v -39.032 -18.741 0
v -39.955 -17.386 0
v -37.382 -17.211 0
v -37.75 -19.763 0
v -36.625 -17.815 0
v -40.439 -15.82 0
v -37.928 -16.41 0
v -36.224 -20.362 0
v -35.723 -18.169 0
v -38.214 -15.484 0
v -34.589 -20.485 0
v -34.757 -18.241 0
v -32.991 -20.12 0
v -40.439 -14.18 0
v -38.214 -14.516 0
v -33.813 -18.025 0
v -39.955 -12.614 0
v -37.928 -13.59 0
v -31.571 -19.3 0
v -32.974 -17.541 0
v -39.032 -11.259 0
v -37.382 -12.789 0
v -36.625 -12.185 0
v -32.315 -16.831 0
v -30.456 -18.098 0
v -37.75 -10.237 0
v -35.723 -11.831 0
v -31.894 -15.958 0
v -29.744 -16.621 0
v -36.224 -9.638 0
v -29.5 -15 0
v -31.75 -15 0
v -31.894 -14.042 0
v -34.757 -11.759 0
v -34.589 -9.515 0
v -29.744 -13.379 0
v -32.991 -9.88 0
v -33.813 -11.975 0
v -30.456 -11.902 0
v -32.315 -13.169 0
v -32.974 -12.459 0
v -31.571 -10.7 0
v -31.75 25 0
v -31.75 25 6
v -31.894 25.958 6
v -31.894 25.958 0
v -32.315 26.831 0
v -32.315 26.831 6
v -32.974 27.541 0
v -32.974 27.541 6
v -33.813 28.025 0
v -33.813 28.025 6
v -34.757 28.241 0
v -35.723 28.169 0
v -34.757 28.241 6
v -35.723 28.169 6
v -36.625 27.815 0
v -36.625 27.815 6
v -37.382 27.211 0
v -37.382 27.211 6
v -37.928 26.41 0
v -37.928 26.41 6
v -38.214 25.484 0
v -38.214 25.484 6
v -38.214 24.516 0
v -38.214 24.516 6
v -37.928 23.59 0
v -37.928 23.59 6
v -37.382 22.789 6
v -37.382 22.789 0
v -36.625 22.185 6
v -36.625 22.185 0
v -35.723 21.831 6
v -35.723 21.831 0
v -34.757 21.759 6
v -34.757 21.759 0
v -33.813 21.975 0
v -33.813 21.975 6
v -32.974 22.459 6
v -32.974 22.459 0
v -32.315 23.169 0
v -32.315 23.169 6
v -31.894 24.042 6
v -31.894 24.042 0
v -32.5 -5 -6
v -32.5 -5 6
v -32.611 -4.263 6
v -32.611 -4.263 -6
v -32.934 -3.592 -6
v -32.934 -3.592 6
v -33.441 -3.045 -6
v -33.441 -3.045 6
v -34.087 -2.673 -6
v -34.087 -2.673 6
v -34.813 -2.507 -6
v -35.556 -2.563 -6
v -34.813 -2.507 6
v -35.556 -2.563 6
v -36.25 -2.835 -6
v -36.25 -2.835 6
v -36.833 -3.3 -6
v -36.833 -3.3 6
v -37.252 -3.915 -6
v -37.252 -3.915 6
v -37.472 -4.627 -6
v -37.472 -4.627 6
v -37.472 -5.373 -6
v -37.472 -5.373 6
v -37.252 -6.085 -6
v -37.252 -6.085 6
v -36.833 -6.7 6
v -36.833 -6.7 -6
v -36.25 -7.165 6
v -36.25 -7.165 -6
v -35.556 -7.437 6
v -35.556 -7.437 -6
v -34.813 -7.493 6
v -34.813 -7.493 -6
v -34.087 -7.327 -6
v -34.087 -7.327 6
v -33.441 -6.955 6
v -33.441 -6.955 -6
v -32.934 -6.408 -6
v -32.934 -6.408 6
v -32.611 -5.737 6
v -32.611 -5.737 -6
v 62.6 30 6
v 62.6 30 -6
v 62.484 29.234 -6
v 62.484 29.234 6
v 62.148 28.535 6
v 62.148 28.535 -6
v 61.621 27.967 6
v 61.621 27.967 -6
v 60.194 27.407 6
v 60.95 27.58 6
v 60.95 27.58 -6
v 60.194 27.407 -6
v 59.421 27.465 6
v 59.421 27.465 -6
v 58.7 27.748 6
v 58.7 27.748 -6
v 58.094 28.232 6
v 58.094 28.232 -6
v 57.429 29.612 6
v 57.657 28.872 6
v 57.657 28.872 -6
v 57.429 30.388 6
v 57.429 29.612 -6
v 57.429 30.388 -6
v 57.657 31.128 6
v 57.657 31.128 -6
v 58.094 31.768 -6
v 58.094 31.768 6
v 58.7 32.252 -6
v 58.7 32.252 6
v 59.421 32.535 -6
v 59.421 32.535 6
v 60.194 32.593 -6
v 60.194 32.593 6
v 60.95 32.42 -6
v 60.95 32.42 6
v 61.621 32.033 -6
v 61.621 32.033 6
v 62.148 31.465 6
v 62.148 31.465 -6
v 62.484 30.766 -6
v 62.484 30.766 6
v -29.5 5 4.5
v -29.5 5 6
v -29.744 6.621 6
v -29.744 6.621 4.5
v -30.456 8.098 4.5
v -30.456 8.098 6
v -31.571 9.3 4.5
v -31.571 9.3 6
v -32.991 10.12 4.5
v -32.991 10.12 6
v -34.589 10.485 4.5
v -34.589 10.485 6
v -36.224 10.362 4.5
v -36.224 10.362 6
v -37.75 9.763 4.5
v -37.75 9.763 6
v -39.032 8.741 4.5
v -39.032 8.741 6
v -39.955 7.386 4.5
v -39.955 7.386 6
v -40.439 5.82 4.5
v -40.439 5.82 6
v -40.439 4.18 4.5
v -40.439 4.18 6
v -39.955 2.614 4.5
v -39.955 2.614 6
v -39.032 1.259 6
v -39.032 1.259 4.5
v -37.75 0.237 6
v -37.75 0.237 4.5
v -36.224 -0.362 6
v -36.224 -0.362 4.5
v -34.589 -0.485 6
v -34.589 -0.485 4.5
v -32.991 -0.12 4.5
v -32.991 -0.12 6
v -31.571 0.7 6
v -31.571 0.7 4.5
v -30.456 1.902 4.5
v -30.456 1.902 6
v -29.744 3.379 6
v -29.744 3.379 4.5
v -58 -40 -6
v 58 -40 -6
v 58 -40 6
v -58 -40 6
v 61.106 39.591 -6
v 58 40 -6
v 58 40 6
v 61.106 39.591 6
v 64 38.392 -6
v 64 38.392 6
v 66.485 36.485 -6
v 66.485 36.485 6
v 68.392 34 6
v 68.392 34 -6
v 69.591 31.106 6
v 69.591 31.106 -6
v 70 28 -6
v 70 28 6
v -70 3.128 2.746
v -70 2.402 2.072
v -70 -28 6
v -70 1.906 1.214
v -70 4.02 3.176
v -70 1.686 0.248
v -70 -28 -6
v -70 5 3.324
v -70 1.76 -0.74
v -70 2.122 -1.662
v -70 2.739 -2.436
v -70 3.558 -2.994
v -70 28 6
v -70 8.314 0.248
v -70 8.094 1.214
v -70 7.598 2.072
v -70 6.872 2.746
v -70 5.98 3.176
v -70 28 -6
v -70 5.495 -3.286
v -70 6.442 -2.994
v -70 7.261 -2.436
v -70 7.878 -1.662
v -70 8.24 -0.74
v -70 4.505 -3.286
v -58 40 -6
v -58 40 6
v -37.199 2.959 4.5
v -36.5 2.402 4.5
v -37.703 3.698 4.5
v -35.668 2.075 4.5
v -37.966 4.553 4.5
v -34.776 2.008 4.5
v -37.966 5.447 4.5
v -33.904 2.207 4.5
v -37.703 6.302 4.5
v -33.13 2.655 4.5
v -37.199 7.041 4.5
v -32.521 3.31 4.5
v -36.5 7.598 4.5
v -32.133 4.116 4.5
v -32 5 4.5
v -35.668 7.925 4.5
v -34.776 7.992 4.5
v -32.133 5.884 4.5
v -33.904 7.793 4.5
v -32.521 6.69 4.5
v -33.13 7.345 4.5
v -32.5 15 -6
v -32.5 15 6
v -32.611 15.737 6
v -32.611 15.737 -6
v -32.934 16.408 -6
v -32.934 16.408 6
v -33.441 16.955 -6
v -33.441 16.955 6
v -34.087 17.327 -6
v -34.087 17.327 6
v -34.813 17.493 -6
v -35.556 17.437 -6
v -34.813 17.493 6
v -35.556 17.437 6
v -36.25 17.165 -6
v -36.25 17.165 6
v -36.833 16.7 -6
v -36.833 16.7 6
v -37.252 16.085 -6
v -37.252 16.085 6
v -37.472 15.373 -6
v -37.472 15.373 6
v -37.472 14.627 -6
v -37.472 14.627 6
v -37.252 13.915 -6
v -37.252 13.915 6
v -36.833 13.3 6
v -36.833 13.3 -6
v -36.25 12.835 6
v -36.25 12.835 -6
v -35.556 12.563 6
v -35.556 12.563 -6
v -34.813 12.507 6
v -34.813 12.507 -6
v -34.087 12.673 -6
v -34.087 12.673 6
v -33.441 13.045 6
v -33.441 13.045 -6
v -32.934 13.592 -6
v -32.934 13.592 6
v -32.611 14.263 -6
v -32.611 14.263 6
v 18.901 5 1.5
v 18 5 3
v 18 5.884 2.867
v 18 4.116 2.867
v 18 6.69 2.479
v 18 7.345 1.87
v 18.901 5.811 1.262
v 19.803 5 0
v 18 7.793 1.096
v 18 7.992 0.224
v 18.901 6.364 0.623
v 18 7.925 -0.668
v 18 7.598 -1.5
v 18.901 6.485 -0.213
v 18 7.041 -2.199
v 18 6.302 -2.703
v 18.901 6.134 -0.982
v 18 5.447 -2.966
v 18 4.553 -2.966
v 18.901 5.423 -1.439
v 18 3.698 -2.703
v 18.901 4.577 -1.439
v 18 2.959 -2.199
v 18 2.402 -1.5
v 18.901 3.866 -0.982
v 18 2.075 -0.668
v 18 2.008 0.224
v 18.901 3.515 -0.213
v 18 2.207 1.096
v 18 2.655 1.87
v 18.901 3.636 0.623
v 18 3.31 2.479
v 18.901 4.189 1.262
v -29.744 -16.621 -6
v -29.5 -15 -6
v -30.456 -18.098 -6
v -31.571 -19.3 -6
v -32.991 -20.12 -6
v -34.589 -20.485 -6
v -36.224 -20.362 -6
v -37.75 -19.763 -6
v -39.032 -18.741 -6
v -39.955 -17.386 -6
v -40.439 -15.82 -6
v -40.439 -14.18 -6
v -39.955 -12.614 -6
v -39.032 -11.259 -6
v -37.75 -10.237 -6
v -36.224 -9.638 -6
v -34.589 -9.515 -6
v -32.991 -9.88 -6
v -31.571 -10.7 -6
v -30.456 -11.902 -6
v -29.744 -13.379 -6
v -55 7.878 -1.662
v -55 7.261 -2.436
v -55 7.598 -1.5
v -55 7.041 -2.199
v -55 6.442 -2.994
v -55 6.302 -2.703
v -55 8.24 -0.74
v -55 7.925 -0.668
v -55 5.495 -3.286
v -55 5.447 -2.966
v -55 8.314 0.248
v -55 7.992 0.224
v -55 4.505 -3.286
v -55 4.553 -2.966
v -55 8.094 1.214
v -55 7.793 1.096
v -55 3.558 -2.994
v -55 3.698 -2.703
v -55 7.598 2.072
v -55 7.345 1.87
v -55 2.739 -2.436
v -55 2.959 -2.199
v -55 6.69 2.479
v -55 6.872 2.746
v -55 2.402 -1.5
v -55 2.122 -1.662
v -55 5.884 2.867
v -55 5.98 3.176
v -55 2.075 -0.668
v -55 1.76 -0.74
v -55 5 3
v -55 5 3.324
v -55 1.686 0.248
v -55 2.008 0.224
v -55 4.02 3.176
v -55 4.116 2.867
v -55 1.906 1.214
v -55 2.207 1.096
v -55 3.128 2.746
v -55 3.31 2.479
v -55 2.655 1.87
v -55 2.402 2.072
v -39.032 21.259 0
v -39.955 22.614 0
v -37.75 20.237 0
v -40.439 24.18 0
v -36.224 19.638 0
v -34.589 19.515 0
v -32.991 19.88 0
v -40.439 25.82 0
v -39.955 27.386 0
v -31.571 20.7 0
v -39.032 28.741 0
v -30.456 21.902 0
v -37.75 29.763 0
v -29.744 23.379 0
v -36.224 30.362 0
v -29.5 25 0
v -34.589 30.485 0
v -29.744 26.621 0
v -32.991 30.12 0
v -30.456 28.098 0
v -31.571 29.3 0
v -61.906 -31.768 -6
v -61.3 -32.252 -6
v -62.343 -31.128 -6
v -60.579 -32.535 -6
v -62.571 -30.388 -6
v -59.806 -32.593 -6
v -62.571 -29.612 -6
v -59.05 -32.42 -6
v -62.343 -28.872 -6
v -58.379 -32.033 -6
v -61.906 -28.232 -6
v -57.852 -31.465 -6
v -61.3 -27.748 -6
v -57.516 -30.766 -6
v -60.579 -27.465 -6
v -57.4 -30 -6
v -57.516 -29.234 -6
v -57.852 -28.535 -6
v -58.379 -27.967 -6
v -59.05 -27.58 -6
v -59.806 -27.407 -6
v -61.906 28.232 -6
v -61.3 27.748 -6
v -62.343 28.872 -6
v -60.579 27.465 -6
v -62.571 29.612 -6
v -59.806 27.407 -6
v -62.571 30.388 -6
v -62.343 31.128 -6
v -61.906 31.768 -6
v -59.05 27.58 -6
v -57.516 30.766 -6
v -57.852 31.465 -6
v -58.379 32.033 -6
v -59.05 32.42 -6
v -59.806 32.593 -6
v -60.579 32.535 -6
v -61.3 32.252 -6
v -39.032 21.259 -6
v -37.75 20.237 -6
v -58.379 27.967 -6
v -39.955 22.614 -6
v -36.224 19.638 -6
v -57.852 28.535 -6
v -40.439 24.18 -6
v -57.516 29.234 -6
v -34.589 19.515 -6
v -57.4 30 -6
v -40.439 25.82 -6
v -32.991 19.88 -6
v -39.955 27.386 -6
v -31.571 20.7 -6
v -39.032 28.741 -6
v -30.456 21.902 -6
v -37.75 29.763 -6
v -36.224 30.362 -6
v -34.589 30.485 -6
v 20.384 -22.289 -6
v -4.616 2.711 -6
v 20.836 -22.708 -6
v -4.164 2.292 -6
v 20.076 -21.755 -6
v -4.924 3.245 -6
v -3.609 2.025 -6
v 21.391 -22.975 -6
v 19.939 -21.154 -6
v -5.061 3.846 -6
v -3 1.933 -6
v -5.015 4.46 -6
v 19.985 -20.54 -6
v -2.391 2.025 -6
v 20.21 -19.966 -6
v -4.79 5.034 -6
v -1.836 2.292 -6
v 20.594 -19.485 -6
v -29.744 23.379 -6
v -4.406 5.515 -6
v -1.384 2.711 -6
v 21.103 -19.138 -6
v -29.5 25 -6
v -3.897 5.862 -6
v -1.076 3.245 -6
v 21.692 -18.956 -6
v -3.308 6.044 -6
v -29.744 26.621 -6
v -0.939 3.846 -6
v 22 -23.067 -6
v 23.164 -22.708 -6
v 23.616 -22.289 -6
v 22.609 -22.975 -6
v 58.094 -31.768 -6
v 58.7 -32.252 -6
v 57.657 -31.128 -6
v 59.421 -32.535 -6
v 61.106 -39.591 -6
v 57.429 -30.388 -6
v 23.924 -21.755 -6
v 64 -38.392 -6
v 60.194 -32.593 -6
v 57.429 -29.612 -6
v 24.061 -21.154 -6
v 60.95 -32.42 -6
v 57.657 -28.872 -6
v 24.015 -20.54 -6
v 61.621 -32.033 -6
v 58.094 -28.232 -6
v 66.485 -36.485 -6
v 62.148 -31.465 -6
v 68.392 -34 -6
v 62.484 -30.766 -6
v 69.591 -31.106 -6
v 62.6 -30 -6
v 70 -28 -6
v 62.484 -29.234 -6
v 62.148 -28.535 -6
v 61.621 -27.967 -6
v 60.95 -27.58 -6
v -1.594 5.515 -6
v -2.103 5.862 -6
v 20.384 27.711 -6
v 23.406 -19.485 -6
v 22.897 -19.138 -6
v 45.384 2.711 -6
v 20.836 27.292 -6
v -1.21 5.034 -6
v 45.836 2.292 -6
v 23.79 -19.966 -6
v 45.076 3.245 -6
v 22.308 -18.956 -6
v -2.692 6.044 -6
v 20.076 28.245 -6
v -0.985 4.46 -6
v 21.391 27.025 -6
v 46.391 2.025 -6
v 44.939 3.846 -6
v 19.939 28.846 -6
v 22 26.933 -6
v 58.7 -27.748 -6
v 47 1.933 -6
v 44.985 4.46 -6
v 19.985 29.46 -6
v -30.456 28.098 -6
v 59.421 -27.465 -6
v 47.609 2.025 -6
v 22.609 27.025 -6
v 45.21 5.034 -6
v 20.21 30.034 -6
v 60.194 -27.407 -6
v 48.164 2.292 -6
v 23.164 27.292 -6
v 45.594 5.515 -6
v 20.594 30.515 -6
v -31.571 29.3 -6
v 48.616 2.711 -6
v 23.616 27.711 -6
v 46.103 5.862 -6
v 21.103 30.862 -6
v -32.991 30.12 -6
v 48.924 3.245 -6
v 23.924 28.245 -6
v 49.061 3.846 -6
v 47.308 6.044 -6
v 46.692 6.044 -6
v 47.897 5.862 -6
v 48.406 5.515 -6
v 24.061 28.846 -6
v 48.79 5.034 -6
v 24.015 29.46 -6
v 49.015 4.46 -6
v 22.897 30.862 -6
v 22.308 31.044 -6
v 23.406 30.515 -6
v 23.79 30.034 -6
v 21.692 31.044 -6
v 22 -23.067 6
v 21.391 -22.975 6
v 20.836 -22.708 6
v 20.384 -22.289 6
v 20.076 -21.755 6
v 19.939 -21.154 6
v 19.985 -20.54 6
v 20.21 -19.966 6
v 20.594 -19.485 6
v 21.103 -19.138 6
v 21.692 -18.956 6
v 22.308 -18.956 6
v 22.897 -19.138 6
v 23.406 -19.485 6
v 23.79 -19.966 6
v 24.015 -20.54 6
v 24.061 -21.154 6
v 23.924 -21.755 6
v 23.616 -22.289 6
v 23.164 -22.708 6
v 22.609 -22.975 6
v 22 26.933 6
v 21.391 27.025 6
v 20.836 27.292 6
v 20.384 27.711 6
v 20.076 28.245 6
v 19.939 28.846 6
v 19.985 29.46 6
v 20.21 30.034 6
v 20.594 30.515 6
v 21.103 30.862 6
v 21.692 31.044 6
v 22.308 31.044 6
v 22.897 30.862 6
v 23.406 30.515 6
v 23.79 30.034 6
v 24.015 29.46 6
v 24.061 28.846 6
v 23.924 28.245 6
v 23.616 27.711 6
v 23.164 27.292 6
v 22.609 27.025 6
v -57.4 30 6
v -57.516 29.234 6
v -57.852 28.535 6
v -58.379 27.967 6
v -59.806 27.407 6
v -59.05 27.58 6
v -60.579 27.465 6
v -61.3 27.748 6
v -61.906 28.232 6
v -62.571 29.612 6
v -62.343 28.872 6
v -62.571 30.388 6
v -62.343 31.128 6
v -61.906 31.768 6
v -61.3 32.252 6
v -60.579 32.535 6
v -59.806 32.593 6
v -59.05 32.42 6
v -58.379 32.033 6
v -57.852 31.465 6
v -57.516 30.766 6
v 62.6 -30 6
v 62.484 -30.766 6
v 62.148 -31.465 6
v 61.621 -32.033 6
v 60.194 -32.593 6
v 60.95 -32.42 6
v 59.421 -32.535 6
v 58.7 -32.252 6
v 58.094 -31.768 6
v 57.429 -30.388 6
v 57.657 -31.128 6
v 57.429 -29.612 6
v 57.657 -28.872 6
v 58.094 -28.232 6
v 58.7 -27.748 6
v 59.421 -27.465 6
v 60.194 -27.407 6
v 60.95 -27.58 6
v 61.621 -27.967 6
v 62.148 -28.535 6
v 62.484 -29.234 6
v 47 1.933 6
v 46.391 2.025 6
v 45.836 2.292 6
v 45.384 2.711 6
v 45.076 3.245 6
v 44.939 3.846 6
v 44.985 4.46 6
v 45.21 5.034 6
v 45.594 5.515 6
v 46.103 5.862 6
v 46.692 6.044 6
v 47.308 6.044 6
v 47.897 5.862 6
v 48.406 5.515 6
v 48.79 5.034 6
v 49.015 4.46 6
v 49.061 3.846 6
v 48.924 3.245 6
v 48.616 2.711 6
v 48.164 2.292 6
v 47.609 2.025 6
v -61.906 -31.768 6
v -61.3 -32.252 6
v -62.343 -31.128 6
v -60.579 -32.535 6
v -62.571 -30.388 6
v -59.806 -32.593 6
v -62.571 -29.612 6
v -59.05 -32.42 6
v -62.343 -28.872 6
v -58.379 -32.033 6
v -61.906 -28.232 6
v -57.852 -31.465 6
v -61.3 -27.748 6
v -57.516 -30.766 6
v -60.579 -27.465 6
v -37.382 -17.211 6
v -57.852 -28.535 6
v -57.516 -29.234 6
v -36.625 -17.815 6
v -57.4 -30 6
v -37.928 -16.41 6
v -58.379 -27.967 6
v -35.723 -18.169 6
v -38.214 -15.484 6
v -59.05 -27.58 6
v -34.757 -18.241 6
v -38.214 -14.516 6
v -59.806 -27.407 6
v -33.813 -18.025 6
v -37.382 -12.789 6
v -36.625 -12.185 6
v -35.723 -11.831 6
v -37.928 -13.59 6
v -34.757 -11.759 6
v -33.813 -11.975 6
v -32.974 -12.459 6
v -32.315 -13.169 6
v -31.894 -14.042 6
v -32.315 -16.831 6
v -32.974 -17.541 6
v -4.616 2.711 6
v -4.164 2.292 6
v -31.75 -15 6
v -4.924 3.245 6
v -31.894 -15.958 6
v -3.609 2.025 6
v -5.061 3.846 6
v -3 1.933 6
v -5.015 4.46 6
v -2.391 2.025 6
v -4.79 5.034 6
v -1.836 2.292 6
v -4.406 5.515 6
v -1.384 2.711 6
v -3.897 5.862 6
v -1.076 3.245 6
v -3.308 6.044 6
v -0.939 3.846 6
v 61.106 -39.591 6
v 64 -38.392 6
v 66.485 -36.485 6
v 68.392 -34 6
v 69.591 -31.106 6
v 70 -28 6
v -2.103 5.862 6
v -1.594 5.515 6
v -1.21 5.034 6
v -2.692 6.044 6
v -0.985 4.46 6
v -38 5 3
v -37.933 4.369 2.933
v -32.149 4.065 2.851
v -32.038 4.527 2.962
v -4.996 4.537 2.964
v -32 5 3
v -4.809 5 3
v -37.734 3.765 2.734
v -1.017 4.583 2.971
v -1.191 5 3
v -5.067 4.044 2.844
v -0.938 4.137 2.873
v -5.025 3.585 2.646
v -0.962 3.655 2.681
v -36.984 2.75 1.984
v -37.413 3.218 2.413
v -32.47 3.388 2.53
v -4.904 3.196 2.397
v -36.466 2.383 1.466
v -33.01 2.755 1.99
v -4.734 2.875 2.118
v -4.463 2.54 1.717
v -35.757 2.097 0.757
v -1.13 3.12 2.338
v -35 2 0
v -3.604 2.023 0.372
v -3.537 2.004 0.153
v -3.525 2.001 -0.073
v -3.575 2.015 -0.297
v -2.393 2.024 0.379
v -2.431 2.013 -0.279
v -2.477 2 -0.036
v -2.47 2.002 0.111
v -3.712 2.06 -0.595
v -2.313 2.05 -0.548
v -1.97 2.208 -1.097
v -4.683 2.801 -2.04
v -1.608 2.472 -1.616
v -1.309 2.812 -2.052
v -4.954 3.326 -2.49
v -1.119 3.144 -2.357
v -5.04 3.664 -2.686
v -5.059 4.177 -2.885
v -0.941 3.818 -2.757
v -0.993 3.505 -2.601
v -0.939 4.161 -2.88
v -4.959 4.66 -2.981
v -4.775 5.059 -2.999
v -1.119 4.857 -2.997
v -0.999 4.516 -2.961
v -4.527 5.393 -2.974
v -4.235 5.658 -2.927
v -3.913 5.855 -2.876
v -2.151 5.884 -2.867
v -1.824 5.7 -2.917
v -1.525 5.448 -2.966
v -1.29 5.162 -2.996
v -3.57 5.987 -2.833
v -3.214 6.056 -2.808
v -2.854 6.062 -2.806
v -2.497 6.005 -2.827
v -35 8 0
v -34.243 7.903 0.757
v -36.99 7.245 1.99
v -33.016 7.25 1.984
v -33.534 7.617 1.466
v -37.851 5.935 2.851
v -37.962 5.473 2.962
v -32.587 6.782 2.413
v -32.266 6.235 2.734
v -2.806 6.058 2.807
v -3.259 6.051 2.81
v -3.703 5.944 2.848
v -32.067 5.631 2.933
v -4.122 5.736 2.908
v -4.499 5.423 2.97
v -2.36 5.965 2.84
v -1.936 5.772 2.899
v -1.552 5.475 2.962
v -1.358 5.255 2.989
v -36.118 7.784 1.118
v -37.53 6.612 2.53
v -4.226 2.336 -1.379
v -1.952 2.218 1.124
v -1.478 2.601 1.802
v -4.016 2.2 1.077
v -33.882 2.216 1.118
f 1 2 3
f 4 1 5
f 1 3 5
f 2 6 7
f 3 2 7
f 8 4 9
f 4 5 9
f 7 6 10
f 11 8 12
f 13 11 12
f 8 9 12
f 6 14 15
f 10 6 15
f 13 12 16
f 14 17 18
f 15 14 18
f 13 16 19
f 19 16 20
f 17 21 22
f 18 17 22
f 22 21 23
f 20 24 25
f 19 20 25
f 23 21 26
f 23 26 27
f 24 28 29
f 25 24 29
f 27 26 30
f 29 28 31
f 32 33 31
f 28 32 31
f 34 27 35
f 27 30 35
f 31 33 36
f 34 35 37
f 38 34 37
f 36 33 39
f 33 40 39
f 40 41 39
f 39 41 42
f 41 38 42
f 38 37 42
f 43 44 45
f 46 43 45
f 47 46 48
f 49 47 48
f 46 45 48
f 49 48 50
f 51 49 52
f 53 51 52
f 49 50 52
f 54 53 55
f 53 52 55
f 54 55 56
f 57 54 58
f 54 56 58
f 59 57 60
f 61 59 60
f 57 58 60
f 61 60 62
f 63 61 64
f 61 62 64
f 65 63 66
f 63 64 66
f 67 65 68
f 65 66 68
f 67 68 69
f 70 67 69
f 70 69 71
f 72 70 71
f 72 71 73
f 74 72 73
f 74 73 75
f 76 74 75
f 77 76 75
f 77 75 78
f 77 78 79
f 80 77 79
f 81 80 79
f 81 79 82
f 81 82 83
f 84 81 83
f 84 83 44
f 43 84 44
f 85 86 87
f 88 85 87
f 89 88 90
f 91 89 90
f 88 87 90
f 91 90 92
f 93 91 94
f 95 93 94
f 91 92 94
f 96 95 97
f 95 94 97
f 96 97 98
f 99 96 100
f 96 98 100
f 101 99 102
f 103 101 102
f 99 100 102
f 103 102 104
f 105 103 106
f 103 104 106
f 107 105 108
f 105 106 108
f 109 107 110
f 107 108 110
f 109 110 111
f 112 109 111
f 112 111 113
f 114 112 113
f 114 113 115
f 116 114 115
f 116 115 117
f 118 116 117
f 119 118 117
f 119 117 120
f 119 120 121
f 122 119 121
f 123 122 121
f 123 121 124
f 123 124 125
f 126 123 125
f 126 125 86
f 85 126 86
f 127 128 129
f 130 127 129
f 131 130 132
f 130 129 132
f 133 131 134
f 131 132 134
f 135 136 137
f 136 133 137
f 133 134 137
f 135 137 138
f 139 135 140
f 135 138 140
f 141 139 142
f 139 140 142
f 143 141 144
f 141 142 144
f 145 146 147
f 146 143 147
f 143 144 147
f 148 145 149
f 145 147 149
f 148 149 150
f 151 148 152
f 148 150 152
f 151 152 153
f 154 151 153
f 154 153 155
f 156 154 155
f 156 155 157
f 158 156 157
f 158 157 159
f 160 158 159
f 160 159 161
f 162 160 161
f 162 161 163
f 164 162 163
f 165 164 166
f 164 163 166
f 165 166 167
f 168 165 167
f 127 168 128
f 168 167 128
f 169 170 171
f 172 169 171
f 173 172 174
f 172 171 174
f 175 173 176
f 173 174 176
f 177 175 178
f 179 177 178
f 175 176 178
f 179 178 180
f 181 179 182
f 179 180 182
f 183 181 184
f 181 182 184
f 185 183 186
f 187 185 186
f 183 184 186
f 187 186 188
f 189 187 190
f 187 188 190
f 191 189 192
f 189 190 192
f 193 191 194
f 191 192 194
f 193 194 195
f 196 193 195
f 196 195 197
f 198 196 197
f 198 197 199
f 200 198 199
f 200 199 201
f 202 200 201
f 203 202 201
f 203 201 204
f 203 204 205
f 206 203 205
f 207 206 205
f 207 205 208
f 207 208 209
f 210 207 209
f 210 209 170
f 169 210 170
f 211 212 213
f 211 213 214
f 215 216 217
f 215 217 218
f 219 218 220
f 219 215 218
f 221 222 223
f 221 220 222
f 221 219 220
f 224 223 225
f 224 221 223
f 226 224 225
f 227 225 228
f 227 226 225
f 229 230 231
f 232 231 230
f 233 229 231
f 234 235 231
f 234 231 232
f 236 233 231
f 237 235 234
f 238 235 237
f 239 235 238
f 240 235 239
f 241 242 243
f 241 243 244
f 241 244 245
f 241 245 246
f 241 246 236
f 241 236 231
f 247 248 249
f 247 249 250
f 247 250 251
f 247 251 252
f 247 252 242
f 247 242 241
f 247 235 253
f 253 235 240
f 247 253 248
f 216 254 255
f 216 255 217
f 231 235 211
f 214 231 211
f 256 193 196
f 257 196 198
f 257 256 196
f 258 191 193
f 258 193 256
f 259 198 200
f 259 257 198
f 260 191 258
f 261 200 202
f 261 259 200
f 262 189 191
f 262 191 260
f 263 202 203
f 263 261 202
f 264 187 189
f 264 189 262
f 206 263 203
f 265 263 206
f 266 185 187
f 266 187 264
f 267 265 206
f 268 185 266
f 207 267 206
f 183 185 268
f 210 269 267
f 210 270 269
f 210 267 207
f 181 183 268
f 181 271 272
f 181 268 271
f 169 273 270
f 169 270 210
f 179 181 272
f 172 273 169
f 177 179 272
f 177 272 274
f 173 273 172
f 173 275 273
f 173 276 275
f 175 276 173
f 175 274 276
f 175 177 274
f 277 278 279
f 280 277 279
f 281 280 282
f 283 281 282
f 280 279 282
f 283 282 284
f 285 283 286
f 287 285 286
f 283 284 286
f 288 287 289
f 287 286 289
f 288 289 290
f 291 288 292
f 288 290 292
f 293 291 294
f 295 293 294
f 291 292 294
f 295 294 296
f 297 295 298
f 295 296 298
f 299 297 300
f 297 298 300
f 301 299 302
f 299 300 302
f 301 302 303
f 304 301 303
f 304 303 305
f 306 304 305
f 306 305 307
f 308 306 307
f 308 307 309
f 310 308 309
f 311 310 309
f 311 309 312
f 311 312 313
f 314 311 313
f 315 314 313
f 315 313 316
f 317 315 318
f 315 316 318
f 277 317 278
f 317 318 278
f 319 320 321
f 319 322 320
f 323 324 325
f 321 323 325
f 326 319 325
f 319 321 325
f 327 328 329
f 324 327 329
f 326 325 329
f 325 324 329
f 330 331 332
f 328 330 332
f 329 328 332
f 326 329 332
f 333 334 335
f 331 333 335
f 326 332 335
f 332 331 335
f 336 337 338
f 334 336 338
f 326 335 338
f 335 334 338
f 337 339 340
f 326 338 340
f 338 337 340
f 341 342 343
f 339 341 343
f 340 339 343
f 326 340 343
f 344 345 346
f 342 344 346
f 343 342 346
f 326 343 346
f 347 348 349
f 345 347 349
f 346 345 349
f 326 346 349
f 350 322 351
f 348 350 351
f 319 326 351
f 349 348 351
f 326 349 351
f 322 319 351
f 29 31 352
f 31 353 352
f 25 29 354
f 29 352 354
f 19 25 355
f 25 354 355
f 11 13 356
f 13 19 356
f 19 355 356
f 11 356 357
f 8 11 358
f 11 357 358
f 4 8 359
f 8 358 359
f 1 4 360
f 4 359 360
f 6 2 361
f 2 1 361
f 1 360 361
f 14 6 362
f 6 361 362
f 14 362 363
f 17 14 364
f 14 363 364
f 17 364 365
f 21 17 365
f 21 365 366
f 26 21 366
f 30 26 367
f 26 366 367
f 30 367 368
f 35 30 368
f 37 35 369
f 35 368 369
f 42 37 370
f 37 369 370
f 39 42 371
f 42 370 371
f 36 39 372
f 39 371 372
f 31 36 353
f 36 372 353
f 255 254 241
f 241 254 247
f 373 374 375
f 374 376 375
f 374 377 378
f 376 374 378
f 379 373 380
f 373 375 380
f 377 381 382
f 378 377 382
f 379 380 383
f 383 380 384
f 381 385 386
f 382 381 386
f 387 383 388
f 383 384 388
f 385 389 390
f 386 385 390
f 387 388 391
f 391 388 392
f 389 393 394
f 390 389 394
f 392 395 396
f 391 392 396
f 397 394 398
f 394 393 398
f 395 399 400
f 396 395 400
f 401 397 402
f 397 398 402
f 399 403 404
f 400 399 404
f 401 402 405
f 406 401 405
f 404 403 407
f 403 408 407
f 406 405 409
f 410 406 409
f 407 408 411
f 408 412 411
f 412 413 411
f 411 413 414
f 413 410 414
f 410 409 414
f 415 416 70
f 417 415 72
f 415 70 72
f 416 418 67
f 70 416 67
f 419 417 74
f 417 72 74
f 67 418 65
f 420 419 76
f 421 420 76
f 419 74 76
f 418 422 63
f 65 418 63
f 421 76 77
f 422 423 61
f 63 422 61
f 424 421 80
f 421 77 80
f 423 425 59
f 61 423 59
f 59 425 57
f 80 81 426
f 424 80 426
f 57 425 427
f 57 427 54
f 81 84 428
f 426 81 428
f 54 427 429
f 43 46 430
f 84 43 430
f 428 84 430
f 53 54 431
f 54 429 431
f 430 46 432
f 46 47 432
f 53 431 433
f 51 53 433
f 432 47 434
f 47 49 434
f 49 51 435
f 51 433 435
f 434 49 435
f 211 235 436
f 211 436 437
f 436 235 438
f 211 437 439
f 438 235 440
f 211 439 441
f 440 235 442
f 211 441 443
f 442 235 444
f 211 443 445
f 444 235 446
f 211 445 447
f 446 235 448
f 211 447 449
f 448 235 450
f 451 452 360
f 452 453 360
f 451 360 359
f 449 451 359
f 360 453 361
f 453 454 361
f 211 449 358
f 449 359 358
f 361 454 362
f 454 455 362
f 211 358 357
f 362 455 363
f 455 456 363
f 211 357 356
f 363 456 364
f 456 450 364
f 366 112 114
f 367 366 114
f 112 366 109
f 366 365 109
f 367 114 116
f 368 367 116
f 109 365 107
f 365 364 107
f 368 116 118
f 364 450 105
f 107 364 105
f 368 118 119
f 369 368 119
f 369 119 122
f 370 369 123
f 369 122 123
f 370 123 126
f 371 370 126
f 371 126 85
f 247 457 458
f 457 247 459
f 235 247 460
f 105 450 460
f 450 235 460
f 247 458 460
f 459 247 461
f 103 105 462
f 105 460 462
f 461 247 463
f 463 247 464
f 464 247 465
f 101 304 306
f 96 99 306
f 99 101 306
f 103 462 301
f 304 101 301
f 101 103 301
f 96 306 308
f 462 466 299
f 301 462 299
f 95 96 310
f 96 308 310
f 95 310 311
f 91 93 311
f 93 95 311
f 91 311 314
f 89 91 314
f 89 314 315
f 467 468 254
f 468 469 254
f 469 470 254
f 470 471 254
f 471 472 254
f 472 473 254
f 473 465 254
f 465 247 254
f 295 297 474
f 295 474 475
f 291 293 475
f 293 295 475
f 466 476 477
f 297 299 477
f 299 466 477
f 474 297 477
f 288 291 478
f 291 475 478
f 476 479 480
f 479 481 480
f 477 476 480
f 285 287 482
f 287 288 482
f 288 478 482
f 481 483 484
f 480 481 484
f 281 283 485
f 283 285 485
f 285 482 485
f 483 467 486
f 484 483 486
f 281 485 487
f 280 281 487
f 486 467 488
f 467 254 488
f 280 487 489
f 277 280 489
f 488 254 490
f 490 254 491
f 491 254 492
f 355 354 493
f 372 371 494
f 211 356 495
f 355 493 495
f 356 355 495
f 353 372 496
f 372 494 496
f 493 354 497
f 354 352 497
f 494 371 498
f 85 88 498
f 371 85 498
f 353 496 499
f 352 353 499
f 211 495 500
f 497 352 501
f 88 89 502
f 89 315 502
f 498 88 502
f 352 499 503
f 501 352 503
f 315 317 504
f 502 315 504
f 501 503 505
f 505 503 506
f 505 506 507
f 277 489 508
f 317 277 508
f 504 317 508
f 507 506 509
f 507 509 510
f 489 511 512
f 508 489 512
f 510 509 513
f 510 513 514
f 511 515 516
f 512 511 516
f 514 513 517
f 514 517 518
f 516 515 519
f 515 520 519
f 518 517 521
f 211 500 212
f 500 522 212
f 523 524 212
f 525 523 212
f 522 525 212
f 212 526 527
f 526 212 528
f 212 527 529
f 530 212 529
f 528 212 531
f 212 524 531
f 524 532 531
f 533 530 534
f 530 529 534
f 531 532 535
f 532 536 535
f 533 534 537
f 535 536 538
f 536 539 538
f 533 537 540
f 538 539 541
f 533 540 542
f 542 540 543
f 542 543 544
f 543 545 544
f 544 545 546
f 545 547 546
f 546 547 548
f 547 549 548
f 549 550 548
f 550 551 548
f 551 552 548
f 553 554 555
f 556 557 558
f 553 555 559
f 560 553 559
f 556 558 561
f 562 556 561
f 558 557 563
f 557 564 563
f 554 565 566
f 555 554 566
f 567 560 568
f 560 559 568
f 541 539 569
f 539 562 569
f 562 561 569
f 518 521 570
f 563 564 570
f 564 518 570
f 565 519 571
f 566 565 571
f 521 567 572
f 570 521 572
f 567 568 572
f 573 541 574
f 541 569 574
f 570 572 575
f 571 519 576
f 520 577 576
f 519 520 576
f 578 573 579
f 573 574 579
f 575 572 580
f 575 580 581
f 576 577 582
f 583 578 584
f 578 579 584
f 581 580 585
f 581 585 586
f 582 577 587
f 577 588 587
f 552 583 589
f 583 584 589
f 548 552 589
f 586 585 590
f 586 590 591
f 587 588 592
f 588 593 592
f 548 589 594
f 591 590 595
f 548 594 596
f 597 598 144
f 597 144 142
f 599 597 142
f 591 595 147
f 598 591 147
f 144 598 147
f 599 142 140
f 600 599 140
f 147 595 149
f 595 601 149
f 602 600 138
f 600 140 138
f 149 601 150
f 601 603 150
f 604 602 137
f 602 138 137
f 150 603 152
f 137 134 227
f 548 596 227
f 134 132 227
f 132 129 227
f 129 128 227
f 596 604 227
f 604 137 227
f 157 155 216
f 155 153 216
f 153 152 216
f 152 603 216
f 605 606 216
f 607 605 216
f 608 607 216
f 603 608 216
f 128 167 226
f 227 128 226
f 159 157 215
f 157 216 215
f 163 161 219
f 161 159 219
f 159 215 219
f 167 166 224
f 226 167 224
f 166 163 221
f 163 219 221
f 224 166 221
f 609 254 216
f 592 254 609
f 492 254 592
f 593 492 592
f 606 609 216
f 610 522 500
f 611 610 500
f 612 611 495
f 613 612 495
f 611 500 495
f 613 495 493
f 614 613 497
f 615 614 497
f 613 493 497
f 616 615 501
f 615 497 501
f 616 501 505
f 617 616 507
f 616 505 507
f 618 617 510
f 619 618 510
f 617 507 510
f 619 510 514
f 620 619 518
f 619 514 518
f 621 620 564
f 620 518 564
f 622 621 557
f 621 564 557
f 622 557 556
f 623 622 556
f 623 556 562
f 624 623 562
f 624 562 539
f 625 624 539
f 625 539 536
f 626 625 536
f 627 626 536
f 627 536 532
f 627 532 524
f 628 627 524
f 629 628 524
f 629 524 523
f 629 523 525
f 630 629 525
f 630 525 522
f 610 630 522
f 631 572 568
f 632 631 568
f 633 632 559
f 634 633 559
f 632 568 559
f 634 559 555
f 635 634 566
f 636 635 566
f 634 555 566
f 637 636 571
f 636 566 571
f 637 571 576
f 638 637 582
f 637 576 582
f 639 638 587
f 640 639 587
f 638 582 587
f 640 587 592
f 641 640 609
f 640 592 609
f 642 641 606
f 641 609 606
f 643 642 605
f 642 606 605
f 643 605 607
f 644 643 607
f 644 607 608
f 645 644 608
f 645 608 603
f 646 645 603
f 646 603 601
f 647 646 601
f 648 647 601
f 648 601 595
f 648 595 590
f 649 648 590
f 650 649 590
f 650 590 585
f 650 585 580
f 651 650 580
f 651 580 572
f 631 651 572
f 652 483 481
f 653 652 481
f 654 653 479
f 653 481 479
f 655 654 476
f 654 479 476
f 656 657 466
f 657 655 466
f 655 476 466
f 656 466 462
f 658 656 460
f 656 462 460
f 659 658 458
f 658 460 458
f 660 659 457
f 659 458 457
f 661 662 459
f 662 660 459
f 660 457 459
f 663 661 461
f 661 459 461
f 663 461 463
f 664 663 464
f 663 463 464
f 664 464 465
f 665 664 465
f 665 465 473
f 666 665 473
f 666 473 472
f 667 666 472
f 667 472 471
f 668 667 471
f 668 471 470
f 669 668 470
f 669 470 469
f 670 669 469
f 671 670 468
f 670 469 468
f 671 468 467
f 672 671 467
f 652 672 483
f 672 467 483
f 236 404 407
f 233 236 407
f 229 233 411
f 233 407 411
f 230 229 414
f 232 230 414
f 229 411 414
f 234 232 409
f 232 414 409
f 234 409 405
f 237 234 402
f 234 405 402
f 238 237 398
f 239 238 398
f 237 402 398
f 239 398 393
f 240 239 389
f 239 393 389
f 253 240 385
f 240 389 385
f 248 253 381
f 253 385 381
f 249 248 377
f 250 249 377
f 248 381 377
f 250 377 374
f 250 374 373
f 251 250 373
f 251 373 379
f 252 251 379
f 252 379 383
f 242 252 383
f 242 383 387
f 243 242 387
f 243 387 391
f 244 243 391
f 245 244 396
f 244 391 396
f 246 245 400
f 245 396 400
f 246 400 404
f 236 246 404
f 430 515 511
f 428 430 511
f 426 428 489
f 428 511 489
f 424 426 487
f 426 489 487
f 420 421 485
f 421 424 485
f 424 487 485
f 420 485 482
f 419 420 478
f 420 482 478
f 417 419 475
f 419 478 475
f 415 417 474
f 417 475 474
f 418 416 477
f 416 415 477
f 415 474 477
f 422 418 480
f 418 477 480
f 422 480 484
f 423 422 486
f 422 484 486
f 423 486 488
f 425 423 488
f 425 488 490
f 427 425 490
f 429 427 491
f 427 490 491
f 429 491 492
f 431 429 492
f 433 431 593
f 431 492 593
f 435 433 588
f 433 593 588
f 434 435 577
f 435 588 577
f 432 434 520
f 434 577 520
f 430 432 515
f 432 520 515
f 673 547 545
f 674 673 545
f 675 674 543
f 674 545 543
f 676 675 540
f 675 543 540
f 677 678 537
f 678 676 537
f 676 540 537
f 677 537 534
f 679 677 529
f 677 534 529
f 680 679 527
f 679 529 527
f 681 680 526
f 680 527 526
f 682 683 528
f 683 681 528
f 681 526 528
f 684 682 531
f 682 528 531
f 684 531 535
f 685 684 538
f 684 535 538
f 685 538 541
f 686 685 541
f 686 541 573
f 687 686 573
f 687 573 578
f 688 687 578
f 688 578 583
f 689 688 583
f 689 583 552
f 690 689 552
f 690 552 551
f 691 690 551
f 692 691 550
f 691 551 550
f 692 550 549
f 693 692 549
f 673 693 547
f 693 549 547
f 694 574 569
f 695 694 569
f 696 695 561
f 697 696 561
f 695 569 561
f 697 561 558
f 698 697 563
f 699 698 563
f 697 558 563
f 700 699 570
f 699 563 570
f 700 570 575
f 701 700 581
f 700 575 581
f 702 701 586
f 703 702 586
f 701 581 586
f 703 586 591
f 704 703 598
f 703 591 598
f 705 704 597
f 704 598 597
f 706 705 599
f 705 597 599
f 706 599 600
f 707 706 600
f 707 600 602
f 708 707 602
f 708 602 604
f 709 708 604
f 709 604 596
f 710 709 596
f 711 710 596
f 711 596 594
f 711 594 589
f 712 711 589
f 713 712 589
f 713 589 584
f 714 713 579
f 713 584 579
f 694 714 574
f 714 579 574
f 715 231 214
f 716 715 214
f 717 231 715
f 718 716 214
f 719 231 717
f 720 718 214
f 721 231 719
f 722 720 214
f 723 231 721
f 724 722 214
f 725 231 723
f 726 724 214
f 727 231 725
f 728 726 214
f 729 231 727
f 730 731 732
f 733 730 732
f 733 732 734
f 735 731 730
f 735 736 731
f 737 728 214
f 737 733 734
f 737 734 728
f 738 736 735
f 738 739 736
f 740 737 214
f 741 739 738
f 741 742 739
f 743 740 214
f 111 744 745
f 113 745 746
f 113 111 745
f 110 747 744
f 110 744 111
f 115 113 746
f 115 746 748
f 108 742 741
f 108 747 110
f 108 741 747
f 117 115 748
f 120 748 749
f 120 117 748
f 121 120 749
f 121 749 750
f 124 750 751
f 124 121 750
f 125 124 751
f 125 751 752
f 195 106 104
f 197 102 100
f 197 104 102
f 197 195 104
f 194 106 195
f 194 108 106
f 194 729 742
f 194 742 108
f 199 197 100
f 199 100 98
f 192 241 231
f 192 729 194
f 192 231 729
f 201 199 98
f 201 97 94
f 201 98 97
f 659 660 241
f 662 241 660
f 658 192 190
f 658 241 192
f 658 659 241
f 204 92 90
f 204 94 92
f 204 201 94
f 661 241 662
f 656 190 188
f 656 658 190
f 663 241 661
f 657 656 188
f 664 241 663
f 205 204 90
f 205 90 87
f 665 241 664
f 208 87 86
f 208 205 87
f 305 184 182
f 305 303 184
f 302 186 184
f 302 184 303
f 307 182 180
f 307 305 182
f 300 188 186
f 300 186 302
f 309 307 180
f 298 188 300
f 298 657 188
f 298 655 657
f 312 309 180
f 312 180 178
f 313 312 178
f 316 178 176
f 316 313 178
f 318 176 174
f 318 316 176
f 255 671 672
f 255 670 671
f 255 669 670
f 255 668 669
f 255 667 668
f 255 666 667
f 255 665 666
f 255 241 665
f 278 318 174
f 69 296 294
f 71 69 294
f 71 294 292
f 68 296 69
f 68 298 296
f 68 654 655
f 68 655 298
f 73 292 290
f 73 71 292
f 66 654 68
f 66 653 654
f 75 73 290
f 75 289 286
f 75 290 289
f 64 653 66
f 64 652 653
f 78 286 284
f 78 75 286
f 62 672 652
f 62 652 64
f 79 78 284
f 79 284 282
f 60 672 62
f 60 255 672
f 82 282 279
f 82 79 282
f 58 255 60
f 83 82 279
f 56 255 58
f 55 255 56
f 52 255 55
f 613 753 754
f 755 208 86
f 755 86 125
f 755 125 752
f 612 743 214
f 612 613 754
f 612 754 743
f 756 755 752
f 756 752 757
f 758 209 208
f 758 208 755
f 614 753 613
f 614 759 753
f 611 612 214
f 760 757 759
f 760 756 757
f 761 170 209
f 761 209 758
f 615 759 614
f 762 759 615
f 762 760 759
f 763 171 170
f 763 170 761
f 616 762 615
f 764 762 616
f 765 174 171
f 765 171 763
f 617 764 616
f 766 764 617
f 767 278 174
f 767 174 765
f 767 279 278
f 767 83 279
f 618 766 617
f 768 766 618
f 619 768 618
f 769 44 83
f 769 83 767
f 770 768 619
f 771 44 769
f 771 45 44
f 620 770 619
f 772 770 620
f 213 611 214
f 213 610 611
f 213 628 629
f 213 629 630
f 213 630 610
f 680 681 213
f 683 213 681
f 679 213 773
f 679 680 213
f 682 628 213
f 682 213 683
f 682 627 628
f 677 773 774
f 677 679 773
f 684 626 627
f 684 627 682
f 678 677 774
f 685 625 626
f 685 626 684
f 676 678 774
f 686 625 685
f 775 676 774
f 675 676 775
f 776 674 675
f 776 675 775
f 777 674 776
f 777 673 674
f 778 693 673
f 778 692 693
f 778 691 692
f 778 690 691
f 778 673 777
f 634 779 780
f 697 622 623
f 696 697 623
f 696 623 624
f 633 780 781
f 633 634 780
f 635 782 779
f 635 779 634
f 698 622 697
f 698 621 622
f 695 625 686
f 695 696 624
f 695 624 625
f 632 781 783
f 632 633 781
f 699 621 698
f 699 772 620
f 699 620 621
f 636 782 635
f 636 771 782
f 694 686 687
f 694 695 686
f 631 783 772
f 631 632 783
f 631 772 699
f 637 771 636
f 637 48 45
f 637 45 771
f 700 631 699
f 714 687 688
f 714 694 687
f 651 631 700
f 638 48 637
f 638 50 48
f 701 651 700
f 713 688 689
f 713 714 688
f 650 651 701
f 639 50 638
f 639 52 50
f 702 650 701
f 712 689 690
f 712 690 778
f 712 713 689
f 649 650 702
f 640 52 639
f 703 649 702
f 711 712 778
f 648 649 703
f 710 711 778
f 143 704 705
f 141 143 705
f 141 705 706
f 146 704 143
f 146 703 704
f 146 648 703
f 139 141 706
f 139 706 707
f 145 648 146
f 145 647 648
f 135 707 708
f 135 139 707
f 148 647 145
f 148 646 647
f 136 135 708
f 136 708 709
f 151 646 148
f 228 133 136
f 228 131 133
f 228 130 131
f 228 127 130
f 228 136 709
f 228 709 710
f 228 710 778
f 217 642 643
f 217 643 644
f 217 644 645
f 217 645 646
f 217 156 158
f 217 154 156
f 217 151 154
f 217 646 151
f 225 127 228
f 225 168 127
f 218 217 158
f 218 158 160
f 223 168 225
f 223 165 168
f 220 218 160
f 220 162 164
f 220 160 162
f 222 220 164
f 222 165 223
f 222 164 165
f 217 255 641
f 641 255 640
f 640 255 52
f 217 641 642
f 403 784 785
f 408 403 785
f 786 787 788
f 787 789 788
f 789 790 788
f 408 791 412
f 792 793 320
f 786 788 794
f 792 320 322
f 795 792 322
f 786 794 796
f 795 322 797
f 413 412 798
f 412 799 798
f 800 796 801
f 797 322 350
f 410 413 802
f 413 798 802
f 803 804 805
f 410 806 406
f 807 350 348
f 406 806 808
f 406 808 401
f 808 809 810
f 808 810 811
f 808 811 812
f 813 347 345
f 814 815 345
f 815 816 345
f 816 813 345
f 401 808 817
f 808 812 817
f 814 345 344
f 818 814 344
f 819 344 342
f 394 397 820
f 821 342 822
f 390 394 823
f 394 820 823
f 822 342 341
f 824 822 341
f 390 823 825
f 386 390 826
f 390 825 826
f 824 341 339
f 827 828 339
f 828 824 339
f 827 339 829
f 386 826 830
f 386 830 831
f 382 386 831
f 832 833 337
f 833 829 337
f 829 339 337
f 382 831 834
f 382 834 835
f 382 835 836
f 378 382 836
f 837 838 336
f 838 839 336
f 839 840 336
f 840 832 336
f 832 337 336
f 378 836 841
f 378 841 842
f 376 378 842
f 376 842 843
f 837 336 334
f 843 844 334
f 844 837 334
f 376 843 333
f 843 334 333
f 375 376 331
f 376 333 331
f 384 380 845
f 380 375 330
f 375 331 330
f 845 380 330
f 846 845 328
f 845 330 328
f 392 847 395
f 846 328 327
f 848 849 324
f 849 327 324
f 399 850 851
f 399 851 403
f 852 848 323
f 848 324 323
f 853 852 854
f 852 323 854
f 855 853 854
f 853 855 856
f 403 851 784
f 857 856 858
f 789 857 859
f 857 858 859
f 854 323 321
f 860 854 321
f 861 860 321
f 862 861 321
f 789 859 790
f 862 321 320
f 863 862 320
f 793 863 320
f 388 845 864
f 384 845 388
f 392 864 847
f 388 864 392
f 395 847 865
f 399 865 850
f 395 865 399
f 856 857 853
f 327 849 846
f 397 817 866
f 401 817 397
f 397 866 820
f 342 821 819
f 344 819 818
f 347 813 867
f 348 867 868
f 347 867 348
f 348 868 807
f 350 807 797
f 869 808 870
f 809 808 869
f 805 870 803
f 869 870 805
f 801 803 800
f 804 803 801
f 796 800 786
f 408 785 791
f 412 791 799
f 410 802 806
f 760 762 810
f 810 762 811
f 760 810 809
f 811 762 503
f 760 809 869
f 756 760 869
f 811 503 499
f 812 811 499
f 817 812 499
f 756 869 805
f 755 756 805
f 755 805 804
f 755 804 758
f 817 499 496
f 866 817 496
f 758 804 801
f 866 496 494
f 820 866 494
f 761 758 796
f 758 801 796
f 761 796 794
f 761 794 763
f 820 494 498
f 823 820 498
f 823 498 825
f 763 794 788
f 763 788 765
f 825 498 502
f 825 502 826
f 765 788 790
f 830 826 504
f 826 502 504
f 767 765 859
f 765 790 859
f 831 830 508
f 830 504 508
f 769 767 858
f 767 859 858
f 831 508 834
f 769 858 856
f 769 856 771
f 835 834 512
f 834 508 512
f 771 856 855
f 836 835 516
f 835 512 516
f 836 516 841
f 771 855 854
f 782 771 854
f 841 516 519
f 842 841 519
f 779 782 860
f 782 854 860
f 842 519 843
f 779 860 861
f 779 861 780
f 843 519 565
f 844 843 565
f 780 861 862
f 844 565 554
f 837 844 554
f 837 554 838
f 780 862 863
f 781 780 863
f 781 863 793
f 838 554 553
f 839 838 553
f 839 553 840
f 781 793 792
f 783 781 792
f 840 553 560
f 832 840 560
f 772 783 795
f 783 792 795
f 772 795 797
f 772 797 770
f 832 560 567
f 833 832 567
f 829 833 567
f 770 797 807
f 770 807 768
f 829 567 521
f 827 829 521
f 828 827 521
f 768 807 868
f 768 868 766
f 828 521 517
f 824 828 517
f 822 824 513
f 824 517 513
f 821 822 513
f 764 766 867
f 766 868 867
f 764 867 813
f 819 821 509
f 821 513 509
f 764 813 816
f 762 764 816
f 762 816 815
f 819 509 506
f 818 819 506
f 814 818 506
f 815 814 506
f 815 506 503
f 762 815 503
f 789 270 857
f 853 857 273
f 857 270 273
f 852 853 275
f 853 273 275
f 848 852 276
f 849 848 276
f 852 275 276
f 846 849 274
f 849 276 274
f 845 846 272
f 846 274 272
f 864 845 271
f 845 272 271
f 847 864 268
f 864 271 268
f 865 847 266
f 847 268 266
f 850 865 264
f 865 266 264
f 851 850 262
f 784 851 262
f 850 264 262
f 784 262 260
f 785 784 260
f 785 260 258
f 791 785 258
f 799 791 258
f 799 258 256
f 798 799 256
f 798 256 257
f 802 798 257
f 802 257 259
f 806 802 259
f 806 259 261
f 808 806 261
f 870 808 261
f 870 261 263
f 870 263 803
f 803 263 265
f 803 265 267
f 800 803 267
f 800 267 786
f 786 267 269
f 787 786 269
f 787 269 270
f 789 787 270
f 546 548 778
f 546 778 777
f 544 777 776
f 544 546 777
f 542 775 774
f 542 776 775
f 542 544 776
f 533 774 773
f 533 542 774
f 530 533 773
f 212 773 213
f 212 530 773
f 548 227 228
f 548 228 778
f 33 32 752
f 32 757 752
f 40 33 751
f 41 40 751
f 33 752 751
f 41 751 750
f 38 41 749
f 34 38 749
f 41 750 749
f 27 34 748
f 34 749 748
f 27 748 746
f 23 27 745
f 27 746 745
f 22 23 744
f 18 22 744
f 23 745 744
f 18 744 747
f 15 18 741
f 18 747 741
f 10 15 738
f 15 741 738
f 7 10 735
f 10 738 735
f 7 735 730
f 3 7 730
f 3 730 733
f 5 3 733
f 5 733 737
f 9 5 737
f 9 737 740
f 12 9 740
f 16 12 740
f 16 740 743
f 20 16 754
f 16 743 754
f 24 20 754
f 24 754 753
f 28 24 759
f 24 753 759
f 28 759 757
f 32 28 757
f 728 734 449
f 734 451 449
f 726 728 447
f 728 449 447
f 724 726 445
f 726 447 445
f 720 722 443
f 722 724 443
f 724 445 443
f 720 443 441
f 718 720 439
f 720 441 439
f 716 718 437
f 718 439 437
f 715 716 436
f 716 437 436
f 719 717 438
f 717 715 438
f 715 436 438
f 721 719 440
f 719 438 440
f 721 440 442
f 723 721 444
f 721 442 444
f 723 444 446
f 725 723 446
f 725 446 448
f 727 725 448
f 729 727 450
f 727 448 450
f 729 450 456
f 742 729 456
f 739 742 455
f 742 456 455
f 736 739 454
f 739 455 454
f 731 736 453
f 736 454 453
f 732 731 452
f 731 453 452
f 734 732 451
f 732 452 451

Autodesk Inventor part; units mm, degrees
ref_plane "YZ Plane" through (0, 0, 0) normal (1, 0, 0) x (0, 1, 0)
ref_plane "XZ Plane" through (0, 0, 0) normal (0, 1, 0) x (-1, 0, 0)
ref_plane "XY Plane" through (0, 0, 0) normal (0, 0, 1) x (1, 0, 0)
sketch "Sketch1" plane through (0, 0, 0) normal (0, 0, 1) x (1, 0, 0)
  line L0 (-58, 40) -> (58, 40)
  line L1 (70, 28) -> (70, -28)
  line L2 (58, -40) -> (-58, -40)
  line L3 (-70, -28) -> (-70, 28)
  arc A0 (70, 28) -> (58, 40) centre (58, 28) ccw
  arc A1 (58, -40) -> (70, -28) centre (58, -28) ccw
  line L4 (-58, 40) -> (-70, 28)
  line L5 (-70, -28) -> (-58, -40)
  line L6 (-70, 0) -> (70, 0) construction
  circle A2 centre (-60, 30) radius 2.6
  circle A3 centre (60, 30) radius 2.6
  line L7 (66.4853, 36.4853) -> (58, 28) construction
  circle A4 centre (-60, -30) radius 2.6
  circle A5 centre (60, -30) radius 2.6
  point P0 (0, 0)
  point P1 (-70, 40)
  point P2 (-70, -40)
  point P3 (0, 40)
  dimension "d0" = 140
  dimension "d1" = 80
  dimension "d2" = 12
  dimension "d3" = 12
  dimension "d4" = 12
  dimension "d5" = 12
  dimension "d6" = 12
  dimension "d7" = 5.2
  dimension "d8" = 120
  dimension "d9" = 60
extrude "Extrusion1" add sketch "Sketch1" along normal mid plane 12
sketch "Sketch2" plane through (-70, -28, 6) normal (-1, 0, 0) x (0, 0, 1)
  line L0 (-12, 68) -> (0, 68) projected
  point P0 (-6, 28)
  point P1 (-6, 33)
  dimension "d12" = 35
hole "Hole1" at (-70, 5, 0) direction (1, 0, 0) diameter 6 depth 88 tip angle 118
sketch "Sketch3" plane through (0, 0, 6) normal (0, 0, 1) x (1, 0, 0)
  line L0 (70, -28) -> (70, 28) projected
  line L1 (-70, 28) -> (-70, -28) projected
  circle A0 centre (22, 4) radius 25 construction
  line L2 (-70, 2) -> (-70, 8) projected
  line L3 (-70, 2) -> (-70, 8) projected
  line L4 (18, 8) -> (18, 2) projected
  line L5 (18, 5) -> (-70, 5) construction
  circle A1 centre (-35, 5) radius 5.5
  circle A2 centre (-35, 25) radius 5.5
  circle A3 centre (-35, 25) radius 3.25
  circle A4 centre (-35, -15) radius 5.5
  circle A5 centre (-35, -15) radius 3.25
  circle A6 centre (-35, 15) radius 2.5
  circle A7 centre (-35, -5) radius 2.5
  circle A8 centre (-35, 5) radius 3
  line L6 (58, 40) -> (-58, 40) projected
  point P0 (0, 0)
  point P1 (22, 29)
  point P2 (-3, 4)
  point P3 (22, -21)
  point P4 (47, 4)
  dimension "d22" = 50
  dimension "d20" = 48
  dimension "d25" = 360
  dimension "d27" = 11
  dimension "d28" = 35
  dimension "d30" = 11
  dimension "d31" = 6.5
  dimension "d32" = 20
  dimension "d33" = 5
  dimension "d34" = 10
  dimension "d51" = 6
  dimension "d59" = 36
hole "Hole2" at (22, 29, 6) at (47, 4, 6) at (22, -21, 6) at (-3, 4, 6) direction (0, 0, -1) diameter 4.134 depth 12 thread size "M5x0.8" class "6H" standard "ISO Metric profile"
extrude "Extrusion2" cut sketch "Sketch3" against normal through all contours A3 | A5 | A6 | A7
extrude "Extrusion3" cut sketch "Sketch3" along normal blind 6 from surface at -12 contours A2 | A4
extrude "Extrusion4" cut sketch "Sketch3" against normal blind 1.5 contours A1 | A8
extrude "Extrusion5" cut sketch "Sketch3" against normal up to surface contours A8
sketch "Sketch4" plane through (-70, -28, 6) normal (-1, 0, 0) x (0, 0, 1)
  circle A0 centre (-6, 33) radius 3 projected
  point P0 (-6, 28)
hole "Hole3" at (-70, 5, 0) direction (1, 0, 0) diameter 6.647 depth 15 thread size "M8x1.25" class "6H" standard "ISO Metric profile"
equation "\"d4\" = d3"
equation "\"d5\" = d3"
equation "\"d6\" = d5"
properties part number "Base"
